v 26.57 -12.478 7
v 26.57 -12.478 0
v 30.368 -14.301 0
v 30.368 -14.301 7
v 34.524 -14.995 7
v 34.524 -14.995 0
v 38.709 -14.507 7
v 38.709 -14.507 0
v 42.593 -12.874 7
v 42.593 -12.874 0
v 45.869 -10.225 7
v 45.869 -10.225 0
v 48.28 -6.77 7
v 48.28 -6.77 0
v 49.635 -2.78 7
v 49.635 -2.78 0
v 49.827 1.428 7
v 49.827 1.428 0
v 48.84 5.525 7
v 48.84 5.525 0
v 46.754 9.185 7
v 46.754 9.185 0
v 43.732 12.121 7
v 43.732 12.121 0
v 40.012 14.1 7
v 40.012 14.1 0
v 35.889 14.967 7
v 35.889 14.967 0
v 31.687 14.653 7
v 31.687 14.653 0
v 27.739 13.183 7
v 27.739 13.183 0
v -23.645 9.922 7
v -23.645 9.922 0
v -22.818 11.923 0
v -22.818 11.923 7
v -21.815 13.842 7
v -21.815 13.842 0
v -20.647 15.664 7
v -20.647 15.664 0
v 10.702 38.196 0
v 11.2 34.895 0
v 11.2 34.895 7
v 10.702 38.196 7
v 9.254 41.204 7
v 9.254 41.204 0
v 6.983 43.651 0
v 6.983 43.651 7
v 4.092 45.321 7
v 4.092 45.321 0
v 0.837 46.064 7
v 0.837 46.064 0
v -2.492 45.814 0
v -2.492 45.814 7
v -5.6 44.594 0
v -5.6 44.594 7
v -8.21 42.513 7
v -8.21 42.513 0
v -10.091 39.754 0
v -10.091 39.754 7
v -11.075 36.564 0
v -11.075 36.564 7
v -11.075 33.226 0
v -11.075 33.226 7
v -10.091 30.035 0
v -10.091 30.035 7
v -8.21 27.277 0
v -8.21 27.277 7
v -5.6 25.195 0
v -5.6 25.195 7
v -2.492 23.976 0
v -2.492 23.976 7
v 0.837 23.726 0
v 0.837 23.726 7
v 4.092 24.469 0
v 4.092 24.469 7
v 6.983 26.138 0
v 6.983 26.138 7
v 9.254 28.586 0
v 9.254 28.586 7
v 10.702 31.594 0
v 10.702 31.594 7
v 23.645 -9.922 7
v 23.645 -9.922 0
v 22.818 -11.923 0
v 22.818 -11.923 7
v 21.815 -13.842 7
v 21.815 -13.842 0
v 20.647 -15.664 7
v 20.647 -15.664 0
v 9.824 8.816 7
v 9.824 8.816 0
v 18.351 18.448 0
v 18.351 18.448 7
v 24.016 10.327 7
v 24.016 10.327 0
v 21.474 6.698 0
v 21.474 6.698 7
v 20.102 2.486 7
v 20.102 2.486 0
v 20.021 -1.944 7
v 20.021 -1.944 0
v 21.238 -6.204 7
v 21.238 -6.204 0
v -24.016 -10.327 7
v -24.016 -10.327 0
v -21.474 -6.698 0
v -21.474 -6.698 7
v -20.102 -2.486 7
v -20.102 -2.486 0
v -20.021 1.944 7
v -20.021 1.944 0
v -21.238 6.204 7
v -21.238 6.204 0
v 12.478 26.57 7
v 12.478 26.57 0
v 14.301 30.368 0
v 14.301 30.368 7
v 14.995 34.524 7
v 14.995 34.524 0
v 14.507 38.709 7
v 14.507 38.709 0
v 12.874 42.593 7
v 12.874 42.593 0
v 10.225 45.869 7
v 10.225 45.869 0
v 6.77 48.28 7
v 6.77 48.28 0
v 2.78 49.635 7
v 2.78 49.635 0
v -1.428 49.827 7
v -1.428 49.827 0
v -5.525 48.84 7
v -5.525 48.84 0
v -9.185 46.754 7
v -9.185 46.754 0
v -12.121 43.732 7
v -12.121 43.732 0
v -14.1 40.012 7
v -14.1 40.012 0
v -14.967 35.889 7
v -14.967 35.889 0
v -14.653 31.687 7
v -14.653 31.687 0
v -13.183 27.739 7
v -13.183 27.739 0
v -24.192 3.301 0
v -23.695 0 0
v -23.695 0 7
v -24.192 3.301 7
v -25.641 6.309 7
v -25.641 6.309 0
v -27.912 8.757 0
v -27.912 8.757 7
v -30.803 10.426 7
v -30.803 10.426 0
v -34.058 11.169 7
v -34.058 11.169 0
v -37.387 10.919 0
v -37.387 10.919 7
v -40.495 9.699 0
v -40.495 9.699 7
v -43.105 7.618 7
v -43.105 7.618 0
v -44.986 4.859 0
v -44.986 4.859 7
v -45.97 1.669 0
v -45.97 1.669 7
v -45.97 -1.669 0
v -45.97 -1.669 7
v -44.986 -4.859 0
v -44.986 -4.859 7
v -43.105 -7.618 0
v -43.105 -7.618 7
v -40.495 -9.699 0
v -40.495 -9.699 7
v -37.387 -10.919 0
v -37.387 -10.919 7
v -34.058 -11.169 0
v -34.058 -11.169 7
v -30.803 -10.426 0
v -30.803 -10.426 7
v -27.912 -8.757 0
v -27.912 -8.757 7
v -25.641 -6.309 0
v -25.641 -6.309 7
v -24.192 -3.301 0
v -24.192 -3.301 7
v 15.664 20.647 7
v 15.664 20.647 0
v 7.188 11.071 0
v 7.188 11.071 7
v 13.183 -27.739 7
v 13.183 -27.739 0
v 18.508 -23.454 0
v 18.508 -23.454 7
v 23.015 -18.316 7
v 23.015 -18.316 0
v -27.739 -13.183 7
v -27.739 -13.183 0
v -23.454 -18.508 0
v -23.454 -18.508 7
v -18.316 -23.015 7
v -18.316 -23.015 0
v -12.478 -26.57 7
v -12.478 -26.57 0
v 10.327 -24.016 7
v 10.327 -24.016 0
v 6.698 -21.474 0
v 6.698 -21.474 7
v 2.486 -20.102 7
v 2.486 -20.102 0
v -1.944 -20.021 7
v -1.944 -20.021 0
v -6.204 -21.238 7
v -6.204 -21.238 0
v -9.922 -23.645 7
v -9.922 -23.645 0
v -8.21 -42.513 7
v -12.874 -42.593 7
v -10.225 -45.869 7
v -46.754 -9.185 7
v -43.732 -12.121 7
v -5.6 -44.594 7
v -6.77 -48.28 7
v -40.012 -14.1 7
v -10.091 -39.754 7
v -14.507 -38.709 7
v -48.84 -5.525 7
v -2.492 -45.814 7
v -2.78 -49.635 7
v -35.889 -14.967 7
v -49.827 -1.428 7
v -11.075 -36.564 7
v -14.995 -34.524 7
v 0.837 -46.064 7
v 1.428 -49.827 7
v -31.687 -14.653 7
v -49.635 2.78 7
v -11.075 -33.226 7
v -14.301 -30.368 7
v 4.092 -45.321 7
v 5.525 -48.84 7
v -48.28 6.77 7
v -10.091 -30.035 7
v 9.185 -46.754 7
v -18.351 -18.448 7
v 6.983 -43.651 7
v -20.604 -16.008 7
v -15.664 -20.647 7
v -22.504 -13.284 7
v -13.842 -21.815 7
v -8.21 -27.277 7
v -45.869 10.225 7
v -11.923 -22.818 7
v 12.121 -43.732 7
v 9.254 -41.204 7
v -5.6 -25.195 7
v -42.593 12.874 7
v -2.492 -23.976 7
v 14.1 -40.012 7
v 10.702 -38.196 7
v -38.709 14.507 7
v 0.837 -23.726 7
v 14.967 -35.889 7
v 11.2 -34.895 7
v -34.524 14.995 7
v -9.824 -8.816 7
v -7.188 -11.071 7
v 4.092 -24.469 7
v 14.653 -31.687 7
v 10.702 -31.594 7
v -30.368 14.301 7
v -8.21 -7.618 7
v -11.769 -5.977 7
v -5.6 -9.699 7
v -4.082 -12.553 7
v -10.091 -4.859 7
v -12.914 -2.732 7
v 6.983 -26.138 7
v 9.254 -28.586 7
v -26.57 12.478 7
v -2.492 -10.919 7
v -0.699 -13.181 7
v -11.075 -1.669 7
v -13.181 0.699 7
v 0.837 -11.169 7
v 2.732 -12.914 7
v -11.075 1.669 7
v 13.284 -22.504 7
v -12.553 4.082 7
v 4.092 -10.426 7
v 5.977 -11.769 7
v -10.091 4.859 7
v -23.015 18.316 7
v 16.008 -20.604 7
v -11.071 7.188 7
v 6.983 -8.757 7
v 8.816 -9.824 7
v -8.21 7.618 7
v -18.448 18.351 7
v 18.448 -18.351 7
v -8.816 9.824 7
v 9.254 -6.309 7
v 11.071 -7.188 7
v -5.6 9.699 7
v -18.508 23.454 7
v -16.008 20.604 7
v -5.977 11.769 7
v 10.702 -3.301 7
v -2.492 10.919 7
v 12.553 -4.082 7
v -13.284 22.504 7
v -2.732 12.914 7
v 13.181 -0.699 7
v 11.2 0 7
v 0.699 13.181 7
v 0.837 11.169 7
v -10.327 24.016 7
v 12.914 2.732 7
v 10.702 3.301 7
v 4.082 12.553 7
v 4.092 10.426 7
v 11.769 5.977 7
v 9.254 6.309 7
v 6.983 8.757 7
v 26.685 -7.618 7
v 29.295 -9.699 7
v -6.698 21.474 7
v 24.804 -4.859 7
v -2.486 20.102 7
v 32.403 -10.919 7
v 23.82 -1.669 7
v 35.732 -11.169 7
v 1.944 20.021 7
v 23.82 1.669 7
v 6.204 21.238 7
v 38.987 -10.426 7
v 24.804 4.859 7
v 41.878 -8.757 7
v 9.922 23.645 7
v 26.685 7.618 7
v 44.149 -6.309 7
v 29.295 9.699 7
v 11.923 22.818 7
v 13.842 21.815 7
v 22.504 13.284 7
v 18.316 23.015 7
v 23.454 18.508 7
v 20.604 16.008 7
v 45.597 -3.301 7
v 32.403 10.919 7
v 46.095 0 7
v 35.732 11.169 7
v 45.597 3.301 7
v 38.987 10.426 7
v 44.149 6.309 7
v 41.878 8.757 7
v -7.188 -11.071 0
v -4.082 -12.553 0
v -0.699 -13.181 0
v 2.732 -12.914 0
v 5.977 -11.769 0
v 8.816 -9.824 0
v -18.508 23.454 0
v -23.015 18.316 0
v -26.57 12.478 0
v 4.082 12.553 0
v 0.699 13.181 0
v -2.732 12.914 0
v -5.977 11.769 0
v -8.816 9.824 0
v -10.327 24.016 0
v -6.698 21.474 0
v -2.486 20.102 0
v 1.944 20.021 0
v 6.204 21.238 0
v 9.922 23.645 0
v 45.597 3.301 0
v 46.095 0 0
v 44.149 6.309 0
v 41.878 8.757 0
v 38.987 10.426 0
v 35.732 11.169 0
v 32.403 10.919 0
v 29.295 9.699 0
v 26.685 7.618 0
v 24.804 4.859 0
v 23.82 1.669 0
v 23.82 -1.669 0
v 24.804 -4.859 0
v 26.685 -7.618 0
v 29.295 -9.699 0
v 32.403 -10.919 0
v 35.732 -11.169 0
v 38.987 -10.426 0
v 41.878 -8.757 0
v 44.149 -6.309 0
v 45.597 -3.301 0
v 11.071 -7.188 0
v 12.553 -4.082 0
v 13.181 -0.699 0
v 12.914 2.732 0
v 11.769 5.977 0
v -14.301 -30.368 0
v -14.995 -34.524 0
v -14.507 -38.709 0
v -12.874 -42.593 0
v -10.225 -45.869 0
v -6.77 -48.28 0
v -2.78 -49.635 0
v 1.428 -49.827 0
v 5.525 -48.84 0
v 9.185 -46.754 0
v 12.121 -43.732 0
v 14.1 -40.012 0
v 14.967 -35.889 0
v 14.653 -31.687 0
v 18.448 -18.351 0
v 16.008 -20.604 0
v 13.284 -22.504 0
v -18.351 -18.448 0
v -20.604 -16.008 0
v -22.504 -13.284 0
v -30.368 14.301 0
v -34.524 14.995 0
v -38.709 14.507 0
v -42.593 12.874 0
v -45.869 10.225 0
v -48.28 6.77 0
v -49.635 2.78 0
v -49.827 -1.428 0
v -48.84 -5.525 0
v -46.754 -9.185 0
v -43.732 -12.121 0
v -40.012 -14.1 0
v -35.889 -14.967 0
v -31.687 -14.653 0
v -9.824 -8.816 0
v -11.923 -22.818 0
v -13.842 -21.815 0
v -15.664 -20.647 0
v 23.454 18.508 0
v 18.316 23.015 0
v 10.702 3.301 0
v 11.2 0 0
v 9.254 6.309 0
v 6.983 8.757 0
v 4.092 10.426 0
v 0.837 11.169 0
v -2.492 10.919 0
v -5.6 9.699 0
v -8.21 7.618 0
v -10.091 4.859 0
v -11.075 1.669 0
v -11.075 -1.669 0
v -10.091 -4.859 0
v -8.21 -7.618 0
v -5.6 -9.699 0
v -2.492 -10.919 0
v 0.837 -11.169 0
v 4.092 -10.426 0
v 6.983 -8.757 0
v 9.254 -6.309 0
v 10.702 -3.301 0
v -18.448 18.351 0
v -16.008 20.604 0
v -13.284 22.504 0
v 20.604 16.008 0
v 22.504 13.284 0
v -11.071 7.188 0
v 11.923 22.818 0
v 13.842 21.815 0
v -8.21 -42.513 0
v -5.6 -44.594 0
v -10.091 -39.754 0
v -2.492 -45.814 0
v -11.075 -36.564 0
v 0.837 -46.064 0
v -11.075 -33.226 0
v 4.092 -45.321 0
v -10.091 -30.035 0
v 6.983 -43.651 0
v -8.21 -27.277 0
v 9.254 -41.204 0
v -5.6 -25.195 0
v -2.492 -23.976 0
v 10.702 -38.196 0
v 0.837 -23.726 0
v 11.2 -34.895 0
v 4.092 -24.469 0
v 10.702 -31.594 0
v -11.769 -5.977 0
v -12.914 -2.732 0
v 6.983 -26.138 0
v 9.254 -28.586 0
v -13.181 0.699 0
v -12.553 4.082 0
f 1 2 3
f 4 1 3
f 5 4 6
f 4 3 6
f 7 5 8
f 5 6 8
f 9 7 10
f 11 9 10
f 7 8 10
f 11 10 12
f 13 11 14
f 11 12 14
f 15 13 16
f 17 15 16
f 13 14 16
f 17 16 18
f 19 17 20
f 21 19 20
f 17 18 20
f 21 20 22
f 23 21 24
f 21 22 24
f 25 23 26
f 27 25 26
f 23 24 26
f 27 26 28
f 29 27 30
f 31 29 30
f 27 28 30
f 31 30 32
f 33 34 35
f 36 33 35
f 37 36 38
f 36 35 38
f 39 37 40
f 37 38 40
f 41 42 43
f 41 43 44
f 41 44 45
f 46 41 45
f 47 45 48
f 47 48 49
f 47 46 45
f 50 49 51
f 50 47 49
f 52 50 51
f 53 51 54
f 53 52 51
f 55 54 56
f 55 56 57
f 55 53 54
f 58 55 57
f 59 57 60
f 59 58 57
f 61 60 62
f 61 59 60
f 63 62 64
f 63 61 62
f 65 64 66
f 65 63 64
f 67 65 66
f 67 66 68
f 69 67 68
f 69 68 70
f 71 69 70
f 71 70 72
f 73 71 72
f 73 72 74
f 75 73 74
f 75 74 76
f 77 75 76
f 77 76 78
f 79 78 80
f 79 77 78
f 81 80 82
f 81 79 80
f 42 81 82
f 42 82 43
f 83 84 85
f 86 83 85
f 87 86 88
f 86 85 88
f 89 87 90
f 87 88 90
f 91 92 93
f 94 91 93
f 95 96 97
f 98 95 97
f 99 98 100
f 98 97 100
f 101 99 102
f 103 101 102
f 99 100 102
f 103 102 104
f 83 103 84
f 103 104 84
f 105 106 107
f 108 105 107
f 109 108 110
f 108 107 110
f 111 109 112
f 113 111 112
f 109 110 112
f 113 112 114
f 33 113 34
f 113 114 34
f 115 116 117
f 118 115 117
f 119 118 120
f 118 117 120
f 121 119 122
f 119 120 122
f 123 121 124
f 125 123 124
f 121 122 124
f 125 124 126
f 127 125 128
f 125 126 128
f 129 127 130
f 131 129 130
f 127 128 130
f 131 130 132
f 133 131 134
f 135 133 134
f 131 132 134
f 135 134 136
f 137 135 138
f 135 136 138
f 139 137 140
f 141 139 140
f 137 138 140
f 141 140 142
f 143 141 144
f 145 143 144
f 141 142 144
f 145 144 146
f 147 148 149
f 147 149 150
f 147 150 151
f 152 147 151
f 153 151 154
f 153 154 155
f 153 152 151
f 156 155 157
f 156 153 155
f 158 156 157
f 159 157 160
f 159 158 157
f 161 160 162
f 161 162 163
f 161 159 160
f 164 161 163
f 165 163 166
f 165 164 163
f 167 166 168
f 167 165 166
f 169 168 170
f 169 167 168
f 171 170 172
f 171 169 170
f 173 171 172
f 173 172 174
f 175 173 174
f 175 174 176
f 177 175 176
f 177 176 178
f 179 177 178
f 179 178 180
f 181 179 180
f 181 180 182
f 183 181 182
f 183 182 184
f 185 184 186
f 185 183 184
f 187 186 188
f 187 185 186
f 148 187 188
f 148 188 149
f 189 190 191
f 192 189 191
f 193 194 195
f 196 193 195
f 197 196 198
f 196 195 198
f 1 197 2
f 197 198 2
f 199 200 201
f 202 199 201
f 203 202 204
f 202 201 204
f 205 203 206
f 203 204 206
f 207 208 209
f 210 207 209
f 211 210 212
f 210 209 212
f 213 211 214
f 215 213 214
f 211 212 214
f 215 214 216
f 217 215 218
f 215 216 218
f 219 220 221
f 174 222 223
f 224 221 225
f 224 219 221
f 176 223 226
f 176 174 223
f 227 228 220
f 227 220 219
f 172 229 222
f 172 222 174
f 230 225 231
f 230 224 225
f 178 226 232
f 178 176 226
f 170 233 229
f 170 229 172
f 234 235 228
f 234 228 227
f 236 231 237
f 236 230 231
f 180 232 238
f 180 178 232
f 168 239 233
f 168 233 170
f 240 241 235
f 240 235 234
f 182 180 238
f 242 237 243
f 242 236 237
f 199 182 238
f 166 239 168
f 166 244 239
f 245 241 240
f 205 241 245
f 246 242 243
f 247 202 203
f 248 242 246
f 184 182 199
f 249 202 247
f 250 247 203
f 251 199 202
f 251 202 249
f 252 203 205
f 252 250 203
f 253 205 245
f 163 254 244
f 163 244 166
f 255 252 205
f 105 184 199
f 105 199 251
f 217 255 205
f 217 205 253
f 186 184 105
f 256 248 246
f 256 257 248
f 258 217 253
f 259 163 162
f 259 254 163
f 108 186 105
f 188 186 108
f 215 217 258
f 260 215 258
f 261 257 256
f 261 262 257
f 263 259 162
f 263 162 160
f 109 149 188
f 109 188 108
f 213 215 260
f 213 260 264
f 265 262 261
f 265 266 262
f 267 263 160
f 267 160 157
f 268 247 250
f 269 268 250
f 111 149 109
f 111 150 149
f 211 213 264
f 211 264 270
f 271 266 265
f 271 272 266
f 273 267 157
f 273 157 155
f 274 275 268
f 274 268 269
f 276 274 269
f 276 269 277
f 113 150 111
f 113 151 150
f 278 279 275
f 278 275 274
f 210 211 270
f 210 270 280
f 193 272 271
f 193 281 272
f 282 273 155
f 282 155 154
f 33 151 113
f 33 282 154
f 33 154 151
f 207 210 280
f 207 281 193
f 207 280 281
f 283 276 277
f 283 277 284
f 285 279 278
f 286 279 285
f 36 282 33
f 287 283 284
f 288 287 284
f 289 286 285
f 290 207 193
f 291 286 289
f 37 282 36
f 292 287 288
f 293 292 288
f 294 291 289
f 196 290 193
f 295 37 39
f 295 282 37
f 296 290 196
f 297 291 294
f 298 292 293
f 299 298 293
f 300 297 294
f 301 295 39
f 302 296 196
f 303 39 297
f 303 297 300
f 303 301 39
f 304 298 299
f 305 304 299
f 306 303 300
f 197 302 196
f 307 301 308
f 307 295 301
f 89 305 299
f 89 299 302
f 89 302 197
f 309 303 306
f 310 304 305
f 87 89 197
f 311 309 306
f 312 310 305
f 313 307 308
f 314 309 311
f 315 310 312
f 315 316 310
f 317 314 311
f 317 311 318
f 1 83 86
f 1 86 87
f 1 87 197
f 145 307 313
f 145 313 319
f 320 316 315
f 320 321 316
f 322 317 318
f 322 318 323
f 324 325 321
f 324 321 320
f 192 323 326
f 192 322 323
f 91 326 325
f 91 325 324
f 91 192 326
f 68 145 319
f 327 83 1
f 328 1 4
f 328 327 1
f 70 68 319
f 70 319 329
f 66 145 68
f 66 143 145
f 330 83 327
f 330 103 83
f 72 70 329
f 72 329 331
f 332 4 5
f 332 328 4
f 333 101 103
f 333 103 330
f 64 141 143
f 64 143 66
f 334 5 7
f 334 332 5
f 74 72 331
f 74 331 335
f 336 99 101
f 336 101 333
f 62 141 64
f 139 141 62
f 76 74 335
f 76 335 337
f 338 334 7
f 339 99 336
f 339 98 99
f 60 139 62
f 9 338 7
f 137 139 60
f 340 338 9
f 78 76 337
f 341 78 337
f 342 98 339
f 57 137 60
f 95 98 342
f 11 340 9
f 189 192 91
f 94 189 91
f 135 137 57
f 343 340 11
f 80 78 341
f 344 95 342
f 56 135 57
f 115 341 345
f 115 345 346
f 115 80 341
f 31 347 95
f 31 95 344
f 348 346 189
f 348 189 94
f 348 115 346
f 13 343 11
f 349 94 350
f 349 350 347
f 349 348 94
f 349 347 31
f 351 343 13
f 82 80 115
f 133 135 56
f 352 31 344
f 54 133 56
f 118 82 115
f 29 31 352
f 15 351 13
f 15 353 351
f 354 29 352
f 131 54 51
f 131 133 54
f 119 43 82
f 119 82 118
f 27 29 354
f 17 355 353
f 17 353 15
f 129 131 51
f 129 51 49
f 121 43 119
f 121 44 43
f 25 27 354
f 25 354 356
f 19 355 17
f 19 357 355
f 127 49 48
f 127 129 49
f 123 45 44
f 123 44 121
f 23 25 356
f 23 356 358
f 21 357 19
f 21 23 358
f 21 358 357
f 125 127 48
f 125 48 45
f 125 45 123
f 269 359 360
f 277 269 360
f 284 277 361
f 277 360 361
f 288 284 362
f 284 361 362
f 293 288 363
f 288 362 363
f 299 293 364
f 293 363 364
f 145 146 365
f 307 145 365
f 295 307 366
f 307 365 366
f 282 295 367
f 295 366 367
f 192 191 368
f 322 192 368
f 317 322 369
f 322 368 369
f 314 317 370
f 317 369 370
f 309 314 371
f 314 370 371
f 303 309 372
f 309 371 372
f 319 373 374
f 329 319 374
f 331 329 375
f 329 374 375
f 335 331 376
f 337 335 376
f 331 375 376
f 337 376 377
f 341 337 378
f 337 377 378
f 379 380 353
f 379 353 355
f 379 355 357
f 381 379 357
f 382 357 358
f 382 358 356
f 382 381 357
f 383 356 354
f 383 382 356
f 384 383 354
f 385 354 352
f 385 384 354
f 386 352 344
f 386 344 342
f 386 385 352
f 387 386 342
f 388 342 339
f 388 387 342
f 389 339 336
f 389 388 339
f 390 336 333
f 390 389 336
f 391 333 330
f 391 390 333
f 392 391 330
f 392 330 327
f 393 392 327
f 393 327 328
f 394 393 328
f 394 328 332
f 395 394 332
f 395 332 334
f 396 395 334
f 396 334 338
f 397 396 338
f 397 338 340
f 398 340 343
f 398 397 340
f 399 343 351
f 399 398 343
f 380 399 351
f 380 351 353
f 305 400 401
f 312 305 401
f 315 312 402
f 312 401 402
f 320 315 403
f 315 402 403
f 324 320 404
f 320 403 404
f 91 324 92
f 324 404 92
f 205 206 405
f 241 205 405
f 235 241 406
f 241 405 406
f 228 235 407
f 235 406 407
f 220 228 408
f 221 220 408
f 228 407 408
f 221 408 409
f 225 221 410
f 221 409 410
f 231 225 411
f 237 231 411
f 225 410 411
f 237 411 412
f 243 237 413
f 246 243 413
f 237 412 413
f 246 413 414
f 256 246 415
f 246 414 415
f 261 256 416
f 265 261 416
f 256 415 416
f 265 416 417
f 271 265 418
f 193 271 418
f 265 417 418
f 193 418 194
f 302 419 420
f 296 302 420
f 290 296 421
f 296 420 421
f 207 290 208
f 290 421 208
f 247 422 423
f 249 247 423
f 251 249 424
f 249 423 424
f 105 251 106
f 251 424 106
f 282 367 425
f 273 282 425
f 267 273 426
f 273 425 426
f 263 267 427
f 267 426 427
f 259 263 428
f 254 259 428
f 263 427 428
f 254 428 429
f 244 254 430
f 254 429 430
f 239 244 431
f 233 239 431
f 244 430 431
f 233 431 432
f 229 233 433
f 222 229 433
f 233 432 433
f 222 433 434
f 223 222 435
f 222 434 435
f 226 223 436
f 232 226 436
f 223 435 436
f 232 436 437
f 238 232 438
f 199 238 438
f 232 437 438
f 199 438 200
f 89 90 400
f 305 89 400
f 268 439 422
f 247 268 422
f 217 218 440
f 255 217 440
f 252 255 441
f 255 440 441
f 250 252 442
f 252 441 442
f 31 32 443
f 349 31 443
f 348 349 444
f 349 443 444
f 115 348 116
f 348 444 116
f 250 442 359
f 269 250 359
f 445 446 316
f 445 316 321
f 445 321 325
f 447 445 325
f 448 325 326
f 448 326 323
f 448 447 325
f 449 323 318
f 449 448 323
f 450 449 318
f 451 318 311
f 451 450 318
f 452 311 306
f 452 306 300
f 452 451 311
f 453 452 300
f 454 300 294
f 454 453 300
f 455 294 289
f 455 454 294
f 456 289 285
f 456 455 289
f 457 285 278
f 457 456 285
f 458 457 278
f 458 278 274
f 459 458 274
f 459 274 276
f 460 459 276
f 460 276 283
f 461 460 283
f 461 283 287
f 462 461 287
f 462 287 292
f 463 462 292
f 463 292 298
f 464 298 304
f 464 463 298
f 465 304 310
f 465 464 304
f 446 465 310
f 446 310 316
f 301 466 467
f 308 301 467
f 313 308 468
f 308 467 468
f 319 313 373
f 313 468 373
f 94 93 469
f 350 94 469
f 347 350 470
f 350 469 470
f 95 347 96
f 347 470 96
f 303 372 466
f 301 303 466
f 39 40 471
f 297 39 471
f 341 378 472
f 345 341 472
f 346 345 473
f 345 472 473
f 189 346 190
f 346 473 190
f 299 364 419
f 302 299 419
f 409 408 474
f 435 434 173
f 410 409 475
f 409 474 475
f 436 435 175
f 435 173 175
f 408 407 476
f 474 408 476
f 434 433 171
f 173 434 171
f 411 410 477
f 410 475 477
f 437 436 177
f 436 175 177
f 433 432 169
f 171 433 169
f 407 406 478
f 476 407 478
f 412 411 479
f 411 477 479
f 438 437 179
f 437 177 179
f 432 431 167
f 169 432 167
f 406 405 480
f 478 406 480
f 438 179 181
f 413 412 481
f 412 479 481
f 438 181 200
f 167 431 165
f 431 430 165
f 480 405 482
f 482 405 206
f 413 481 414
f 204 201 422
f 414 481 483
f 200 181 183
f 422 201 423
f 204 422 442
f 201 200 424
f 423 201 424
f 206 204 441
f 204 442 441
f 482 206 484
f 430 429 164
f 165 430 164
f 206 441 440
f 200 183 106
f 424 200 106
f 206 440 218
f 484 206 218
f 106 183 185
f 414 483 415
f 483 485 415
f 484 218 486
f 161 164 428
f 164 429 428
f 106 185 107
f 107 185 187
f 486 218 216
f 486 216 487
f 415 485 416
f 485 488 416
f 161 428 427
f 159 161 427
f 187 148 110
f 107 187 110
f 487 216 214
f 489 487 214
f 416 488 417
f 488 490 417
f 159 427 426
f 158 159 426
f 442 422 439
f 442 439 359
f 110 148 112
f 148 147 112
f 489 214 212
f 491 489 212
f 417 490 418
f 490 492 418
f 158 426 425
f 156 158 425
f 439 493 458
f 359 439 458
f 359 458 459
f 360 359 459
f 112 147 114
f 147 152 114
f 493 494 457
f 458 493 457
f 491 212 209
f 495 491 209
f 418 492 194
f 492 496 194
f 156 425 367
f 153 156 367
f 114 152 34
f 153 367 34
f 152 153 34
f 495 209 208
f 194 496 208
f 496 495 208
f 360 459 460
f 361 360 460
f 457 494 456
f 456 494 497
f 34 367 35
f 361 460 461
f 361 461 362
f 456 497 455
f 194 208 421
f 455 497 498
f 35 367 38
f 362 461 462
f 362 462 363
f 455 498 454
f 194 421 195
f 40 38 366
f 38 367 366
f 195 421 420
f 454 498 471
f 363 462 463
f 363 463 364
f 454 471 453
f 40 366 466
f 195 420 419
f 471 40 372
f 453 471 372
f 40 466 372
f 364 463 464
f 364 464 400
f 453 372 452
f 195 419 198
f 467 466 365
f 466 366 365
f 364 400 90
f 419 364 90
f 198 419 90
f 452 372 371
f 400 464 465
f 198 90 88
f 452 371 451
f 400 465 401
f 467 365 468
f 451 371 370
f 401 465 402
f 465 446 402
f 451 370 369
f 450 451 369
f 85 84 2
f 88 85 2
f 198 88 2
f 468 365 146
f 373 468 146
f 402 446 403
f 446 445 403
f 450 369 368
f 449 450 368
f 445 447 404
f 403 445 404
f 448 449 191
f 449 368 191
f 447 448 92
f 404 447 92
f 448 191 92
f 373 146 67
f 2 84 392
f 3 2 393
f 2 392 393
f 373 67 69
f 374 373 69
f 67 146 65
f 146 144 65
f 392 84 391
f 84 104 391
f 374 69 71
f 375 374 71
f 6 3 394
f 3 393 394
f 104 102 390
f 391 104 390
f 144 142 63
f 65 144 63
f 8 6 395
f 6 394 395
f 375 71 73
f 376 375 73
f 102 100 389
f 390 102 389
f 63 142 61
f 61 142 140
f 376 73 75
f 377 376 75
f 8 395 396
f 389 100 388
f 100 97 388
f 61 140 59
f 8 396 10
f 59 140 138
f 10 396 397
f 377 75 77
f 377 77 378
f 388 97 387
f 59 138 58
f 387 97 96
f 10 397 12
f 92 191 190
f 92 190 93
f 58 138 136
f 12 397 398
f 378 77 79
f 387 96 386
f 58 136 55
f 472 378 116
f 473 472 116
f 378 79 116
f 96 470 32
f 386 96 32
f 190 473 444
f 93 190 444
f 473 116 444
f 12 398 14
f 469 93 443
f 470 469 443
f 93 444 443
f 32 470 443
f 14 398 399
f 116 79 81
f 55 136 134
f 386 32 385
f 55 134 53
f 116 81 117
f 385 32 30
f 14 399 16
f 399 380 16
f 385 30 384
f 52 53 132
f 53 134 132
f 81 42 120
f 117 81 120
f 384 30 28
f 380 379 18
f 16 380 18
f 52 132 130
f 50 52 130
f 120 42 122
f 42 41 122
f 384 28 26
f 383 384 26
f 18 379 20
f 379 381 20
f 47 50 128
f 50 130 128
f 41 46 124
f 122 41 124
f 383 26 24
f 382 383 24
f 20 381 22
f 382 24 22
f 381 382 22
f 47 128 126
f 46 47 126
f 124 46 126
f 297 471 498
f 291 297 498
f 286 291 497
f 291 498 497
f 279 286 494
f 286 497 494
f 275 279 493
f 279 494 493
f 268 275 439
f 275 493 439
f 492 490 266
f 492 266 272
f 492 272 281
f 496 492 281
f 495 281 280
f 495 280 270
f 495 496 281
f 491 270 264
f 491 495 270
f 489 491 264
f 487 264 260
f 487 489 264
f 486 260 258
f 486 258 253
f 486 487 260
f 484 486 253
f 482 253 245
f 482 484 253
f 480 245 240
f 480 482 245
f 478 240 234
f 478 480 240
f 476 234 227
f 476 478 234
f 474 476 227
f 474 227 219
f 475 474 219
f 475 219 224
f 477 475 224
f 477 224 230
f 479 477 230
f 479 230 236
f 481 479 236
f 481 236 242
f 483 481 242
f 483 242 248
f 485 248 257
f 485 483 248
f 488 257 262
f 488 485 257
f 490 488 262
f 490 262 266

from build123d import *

# Parameters (mm, degrees)
F0_R     = 11.2
F1_DEPTH = 7


with BuildPart() as f1:
    # F0 (on Top) → F1 (new body)
    with BuildSketch(Plane.XY):
        with BuildLine():
            ThreePointArc((-13.18295, 27.738768), (-20.872941, 20.982416), (-26.569568, 12.477552))
            ThreePointArc((-26.569568, 12.477552), (-49.879326, 0.682754), (-27.738768, -13.18295))
            ThreePointArc((-27.738768, -13.18295), (-20.982416, -20.872941), (-12.477552, -26.569568))
            ThreePointArc((-12.477552, -26.569568), (-0.682754, -49.879326), (13.18295, -27.738768))
            ThreePointArc((13.18295, -27.738768), (20.872941, -20.982416), (26.569568, -12.477552))
            ThreePointArc((26.569568, -12.477552), (49.879326, -0.682754), (27.738768, 13.18295))
            ThreePointArc((27.738768, 13.18295), (20.982416, 20.872941), (12.477552, 26.569568))
            ThreePointArc((12.477552, 26.569568), (0.682754, 49.879326), (-13.18295, 27.738768))
        make_face()
        with BuildLine():
            Line((-20.646999, 15.66407), (-11.071281, 7.187957))
            ThreePointArc((-11.071281, 7.187957), (-13.160123, -1.025268), (-9.824467, -8.815886))
            Line((-9.824467, -8.815886), (-18.350719, -18.448246))
            ThreePointArc((-18.350719, -18.448246), (-21.599994, -14.678222), (-24.015539, -10.32667))
            ThreePointArc((-24.015539, -10.32667), (-19.897377, -0.274085), (-23.645482, 9.922259))
            ThreePointArc((-23.645482, 9.922259), (-22.337874, 12.893239), (-20.646999, 15.66407))
        make_face(mode=Mode.SUBTRACT)
        with Locations((0, -34.894872)):
            Circle(F0_R, mode=Mode.SUBTRACT)
        with BuildLine():
            ThreePointArc((10.32667, -24.015539), (0.274085, -19.897377), (-9.922259, -23.645482))
            ThreePointArc((-9.922259, -23.645482), (-12.893239, -22.337874), (-15.66407, -20.646999))
            Line((-15.66407, -20.646999), (-7.187957, -11.071281))
            ThreePointArc((-7.187957, -11.071281), (1.025268, -13.160123), (8.815886, -9.824467))
            Line((8.815886, -9.824467), (18.448246, -18.350719))
            ThreePointArc((18.448246, -18.350719), (14.678222, -21.599994), (10.32667, -24.015539))
        make_face(mode=Mode.SUBTRACT)
        with Locations((-34.894872, 0)):
            Circle(F0_R, mode=Mode.SUBTRACT)
        with BuildLine():
            ThreePointArc((-18.448246, 18.350719), (-14.678222, 21.599994), (-10.32667, 24.015539))
            ThreePointArc((-10.32667, 24.015539), (-0.274085, 19.897377), (9.922259, 23.645482))
            ThreePointArc((9.922259, 23.645482), (12.893239, 22.337874), (15.66407, 20.646999))
            Line((15.66407, 20.646999), (7.187957, 11.071281))
            ThreePointArc((7.187957, 11.071281), (-1.025268, 13.160123), (-8.815886, 9.824467))
            Line((-8.815886, 9.824467), (-18.448246, 18.350719))
        make_face(mode=Mode.SUBTRACT)
        Circle(F0_R, mode=Mode.SUBTRACT)
        with BuildLine():
            ThreePointArc((18.350719, 18.448246), (21.599994, 14.678222), (24.015539, 10.32667))
            ThreePointArc((24.015539, 10.32667), (19.897377, 0.274085), (23.645482, -9.922259))
            ThreePointArc((23.645482, -9.922259), (22.337874, -12.893239), (20.646999, -15.66407))
            Line((20.646999, -15.66407), (11.071281, -7.187957))
            ThreePointArc((11.071281, -7.187957), (13.160123, 1.025268), (9.824467, 8.815886))
            Line((9.824467, 8.815886), (18.350719, 18.448246))
        make_face(mode=Mode.SUBTRACT)
        with Locations((34.894872, 0)):
            Circle(F0_R, mode=Mode.SUBTRACT)
        with Locations((0, 34.894872)):
            Circle(F0_R, mode=Mode.SUBTRACT)
    extrude(amount=F1_DEPTH)


solid = f1.part
